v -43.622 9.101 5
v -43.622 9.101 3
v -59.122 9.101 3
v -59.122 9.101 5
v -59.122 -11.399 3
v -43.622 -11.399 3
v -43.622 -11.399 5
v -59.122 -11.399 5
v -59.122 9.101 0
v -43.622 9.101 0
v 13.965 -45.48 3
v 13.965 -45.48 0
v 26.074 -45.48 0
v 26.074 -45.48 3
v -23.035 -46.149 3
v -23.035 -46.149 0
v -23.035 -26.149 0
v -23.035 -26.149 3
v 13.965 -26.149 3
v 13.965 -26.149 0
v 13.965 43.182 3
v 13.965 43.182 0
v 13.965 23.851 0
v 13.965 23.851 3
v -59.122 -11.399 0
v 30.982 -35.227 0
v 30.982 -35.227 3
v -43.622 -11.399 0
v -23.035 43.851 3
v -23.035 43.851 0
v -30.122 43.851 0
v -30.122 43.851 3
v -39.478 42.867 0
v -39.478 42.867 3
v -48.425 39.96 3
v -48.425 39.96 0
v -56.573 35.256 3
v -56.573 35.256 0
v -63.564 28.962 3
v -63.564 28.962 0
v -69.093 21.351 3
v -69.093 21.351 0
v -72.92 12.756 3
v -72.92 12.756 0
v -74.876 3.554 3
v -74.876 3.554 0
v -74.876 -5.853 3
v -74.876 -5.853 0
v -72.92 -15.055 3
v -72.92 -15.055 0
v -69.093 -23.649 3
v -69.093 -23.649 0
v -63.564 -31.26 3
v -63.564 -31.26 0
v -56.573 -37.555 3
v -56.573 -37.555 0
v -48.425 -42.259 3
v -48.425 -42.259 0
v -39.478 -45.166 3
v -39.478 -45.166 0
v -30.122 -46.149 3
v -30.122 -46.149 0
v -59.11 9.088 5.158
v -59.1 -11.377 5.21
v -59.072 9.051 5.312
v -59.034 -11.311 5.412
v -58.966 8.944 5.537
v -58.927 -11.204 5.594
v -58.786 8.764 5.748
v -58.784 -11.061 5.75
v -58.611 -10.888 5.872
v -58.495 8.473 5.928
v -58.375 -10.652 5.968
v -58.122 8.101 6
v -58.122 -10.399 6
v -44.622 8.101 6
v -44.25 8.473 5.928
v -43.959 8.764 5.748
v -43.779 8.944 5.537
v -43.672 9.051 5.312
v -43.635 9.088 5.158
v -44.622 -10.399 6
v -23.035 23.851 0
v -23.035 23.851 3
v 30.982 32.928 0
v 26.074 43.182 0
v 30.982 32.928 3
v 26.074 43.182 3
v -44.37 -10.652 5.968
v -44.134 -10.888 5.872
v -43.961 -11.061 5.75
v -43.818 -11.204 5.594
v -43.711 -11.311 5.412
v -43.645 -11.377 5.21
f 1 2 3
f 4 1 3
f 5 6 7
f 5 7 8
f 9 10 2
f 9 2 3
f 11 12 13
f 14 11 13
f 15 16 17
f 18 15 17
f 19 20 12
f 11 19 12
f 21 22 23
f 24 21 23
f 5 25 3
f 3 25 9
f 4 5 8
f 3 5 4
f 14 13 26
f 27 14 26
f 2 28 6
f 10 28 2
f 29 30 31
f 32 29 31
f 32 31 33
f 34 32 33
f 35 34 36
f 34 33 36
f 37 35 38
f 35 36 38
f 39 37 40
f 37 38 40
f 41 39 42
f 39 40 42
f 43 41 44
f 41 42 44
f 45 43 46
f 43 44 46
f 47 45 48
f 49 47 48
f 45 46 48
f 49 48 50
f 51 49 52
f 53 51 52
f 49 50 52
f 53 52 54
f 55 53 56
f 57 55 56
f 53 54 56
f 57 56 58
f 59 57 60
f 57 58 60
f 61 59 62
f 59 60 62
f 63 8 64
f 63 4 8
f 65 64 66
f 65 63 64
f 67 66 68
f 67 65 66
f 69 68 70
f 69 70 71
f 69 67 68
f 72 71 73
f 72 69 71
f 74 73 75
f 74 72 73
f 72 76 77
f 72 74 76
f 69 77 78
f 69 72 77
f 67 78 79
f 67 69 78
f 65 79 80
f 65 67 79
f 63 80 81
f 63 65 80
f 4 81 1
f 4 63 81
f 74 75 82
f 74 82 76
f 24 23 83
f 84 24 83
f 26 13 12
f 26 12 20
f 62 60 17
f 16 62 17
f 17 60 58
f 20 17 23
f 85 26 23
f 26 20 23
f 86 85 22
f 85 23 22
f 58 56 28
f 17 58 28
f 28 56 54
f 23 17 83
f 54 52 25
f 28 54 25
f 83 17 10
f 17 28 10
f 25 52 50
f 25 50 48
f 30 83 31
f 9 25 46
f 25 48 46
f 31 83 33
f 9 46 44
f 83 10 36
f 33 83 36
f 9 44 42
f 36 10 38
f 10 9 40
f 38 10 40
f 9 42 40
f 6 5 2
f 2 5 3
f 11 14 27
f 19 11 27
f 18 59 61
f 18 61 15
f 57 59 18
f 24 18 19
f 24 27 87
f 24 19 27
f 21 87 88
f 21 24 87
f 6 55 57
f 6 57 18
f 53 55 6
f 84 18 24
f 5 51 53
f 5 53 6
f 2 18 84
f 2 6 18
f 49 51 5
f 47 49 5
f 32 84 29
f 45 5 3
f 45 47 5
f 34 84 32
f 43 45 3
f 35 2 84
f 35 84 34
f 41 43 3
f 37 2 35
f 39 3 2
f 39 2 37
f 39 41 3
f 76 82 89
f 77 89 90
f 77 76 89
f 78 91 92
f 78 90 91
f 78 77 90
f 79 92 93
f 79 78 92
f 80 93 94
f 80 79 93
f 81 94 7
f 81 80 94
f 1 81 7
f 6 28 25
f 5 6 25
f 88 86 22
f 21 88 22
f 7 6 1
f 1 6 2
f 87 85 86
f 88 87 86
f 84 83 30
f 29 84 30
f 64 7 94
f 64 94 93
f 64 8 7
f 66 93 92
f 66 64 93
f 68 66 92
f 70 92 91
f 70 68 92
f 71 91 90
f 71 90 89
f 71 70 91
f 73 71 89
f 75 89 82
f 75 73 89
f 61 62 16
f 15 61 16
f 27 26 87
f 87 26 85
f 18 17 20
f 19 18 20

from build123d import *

# Parameters (mm, degrees)
SKETCH1_W           = 20.5
SKETCH1_H           = 15.5
BOSS_EXTRUDE1_DEPTH = 3
SKETCH1_10_W        = 20.5
SKETCH1_10_H        = 15.5
BOSS_EXTRUDE3_DEPTH = 6
SKETCH1_12_W        = 20.5
SKETCH1_12_H        = 15.5
CUT_EXTRUDE4_DEPTH  = 3
FILLET3_R           = 1


with BuildPart() as part:
    # Sketch1 → Boss-Extrude1 (new body)
    with BuildSketch(Plane(origin=(0, 0, 0), x_dir=(0, 1, 0), z_dir=(0, 0, 1))):
        with BuildLine():
            Line((-46.14933559, 23.035082174), (-26.14933559, 23.035082174))
            Line((-26.14933559, 23.035082174), (-26.14933559, -13.964917826))
            Line((-26.14933559, -13.964917826), (-45.480329832, -13.964917826))
            Line((-45.480329832, -13.964917826), (-45.480329832, -26.073683481))
            Line((-45.480329832, -26.073683481), (-35.226642372, -30.982423901))
            Line((-35.226642372, -30.982423901), (32.927971192, -30.982423901))
            Line((32.927971192, -30.982423901), (43.181658652, -26.073683481))
            Line((43.181658652, -26.073683481), (43.181658652, -13.964917826))
            Line((43.181658652, -13.964917826), (23.85066441, -13.964917826))
            Line((23.85066441, -13.964917826), (23.85066441, 23.035082174))
            Line((23.85066441, 23.035082174), (43.85066441, 23.035082174))
            Line((43.85066441, 23.035082174), (43.85066441, 30.122273759))
            ThreePointArc((43.85066441, 30.122273759), (-1.14933559, 75.122273759), (-46.14933559, 30.122273759))
            Line((-46.14933559, 30.122273759), (-46.14933559, 23.035082174))
        make_face()
        with Locations((-1.14933559, 51.372273759)):
            Rectangle(SKETCH1_W, SKETCH1_H, mode=Mode.SUBTRACT)
    extrude(amount=BOSS_EXTRUDE1_DEPTH)

    # Sketch1<10> → Boss-Extrude3 (add)
    with BuildSketch(Plane(origin=(0, 0, 0), x_dir=(0, 1, 0), z_dir=(0, 0, 1))):
        with Locations((-1.14933559, 51.372273759)):
            Rectangle(SKETCH1_10_W, SKETCH1_10_H)
    extrude(amount=BOSS_EXTRUDE3_DEPTH)

    # Sketch1<12> → Cut-Extrude4 (cut)
    with BuildSketch(Plane(origin=(0, 0, 0), x_dir=(0, 1, 0), z_dir=(0, 0, 1))):
        with Locations((-1.14933559, 51.372273759)):
            Rectangle(SKETCH1_12_W, SKETCH1_12_H)
    extrude(amount=CUT_EXTRUDE4_DEPTH, mode=Mode.SUBTRACT)


with BuildPart() as cut_extrude4_piece_1:
    # of the separate pieces the step leaves, piece 1, a body of its own (cut_extrude4_pieces)
    add(part.part.solids().sort_by_distance((-23.035082174, -46.14933559, 0))[0])


with BuildPart() as cut_extrude4_piece_2:
    # of the separate pieces the step leaves, piece 2, a body of its own (cut_extrude4_pieces)
    add(part.part.solids().sort_by_distance((-59.122273759, 9.10066441, 6))[0])

    # Fillet3
    fillet3_edges = [cut_extrude4_piece_2.edges().sort_by_distance(p)[0] for p in [
        (-51.372273759, 9.10066441, 6),
        (-59.122273759, -1.14933559, 6),
        (-51.372273759, -11.39933559, 6),
        (-43.622273759, -1.14933559, 6),
    ]]
    fillet(fillet3_edges, radius=FILLET3_R)


solid = Compound([cut_extrude4_piece_1.part, cut_extrude4_piece_2.part])
